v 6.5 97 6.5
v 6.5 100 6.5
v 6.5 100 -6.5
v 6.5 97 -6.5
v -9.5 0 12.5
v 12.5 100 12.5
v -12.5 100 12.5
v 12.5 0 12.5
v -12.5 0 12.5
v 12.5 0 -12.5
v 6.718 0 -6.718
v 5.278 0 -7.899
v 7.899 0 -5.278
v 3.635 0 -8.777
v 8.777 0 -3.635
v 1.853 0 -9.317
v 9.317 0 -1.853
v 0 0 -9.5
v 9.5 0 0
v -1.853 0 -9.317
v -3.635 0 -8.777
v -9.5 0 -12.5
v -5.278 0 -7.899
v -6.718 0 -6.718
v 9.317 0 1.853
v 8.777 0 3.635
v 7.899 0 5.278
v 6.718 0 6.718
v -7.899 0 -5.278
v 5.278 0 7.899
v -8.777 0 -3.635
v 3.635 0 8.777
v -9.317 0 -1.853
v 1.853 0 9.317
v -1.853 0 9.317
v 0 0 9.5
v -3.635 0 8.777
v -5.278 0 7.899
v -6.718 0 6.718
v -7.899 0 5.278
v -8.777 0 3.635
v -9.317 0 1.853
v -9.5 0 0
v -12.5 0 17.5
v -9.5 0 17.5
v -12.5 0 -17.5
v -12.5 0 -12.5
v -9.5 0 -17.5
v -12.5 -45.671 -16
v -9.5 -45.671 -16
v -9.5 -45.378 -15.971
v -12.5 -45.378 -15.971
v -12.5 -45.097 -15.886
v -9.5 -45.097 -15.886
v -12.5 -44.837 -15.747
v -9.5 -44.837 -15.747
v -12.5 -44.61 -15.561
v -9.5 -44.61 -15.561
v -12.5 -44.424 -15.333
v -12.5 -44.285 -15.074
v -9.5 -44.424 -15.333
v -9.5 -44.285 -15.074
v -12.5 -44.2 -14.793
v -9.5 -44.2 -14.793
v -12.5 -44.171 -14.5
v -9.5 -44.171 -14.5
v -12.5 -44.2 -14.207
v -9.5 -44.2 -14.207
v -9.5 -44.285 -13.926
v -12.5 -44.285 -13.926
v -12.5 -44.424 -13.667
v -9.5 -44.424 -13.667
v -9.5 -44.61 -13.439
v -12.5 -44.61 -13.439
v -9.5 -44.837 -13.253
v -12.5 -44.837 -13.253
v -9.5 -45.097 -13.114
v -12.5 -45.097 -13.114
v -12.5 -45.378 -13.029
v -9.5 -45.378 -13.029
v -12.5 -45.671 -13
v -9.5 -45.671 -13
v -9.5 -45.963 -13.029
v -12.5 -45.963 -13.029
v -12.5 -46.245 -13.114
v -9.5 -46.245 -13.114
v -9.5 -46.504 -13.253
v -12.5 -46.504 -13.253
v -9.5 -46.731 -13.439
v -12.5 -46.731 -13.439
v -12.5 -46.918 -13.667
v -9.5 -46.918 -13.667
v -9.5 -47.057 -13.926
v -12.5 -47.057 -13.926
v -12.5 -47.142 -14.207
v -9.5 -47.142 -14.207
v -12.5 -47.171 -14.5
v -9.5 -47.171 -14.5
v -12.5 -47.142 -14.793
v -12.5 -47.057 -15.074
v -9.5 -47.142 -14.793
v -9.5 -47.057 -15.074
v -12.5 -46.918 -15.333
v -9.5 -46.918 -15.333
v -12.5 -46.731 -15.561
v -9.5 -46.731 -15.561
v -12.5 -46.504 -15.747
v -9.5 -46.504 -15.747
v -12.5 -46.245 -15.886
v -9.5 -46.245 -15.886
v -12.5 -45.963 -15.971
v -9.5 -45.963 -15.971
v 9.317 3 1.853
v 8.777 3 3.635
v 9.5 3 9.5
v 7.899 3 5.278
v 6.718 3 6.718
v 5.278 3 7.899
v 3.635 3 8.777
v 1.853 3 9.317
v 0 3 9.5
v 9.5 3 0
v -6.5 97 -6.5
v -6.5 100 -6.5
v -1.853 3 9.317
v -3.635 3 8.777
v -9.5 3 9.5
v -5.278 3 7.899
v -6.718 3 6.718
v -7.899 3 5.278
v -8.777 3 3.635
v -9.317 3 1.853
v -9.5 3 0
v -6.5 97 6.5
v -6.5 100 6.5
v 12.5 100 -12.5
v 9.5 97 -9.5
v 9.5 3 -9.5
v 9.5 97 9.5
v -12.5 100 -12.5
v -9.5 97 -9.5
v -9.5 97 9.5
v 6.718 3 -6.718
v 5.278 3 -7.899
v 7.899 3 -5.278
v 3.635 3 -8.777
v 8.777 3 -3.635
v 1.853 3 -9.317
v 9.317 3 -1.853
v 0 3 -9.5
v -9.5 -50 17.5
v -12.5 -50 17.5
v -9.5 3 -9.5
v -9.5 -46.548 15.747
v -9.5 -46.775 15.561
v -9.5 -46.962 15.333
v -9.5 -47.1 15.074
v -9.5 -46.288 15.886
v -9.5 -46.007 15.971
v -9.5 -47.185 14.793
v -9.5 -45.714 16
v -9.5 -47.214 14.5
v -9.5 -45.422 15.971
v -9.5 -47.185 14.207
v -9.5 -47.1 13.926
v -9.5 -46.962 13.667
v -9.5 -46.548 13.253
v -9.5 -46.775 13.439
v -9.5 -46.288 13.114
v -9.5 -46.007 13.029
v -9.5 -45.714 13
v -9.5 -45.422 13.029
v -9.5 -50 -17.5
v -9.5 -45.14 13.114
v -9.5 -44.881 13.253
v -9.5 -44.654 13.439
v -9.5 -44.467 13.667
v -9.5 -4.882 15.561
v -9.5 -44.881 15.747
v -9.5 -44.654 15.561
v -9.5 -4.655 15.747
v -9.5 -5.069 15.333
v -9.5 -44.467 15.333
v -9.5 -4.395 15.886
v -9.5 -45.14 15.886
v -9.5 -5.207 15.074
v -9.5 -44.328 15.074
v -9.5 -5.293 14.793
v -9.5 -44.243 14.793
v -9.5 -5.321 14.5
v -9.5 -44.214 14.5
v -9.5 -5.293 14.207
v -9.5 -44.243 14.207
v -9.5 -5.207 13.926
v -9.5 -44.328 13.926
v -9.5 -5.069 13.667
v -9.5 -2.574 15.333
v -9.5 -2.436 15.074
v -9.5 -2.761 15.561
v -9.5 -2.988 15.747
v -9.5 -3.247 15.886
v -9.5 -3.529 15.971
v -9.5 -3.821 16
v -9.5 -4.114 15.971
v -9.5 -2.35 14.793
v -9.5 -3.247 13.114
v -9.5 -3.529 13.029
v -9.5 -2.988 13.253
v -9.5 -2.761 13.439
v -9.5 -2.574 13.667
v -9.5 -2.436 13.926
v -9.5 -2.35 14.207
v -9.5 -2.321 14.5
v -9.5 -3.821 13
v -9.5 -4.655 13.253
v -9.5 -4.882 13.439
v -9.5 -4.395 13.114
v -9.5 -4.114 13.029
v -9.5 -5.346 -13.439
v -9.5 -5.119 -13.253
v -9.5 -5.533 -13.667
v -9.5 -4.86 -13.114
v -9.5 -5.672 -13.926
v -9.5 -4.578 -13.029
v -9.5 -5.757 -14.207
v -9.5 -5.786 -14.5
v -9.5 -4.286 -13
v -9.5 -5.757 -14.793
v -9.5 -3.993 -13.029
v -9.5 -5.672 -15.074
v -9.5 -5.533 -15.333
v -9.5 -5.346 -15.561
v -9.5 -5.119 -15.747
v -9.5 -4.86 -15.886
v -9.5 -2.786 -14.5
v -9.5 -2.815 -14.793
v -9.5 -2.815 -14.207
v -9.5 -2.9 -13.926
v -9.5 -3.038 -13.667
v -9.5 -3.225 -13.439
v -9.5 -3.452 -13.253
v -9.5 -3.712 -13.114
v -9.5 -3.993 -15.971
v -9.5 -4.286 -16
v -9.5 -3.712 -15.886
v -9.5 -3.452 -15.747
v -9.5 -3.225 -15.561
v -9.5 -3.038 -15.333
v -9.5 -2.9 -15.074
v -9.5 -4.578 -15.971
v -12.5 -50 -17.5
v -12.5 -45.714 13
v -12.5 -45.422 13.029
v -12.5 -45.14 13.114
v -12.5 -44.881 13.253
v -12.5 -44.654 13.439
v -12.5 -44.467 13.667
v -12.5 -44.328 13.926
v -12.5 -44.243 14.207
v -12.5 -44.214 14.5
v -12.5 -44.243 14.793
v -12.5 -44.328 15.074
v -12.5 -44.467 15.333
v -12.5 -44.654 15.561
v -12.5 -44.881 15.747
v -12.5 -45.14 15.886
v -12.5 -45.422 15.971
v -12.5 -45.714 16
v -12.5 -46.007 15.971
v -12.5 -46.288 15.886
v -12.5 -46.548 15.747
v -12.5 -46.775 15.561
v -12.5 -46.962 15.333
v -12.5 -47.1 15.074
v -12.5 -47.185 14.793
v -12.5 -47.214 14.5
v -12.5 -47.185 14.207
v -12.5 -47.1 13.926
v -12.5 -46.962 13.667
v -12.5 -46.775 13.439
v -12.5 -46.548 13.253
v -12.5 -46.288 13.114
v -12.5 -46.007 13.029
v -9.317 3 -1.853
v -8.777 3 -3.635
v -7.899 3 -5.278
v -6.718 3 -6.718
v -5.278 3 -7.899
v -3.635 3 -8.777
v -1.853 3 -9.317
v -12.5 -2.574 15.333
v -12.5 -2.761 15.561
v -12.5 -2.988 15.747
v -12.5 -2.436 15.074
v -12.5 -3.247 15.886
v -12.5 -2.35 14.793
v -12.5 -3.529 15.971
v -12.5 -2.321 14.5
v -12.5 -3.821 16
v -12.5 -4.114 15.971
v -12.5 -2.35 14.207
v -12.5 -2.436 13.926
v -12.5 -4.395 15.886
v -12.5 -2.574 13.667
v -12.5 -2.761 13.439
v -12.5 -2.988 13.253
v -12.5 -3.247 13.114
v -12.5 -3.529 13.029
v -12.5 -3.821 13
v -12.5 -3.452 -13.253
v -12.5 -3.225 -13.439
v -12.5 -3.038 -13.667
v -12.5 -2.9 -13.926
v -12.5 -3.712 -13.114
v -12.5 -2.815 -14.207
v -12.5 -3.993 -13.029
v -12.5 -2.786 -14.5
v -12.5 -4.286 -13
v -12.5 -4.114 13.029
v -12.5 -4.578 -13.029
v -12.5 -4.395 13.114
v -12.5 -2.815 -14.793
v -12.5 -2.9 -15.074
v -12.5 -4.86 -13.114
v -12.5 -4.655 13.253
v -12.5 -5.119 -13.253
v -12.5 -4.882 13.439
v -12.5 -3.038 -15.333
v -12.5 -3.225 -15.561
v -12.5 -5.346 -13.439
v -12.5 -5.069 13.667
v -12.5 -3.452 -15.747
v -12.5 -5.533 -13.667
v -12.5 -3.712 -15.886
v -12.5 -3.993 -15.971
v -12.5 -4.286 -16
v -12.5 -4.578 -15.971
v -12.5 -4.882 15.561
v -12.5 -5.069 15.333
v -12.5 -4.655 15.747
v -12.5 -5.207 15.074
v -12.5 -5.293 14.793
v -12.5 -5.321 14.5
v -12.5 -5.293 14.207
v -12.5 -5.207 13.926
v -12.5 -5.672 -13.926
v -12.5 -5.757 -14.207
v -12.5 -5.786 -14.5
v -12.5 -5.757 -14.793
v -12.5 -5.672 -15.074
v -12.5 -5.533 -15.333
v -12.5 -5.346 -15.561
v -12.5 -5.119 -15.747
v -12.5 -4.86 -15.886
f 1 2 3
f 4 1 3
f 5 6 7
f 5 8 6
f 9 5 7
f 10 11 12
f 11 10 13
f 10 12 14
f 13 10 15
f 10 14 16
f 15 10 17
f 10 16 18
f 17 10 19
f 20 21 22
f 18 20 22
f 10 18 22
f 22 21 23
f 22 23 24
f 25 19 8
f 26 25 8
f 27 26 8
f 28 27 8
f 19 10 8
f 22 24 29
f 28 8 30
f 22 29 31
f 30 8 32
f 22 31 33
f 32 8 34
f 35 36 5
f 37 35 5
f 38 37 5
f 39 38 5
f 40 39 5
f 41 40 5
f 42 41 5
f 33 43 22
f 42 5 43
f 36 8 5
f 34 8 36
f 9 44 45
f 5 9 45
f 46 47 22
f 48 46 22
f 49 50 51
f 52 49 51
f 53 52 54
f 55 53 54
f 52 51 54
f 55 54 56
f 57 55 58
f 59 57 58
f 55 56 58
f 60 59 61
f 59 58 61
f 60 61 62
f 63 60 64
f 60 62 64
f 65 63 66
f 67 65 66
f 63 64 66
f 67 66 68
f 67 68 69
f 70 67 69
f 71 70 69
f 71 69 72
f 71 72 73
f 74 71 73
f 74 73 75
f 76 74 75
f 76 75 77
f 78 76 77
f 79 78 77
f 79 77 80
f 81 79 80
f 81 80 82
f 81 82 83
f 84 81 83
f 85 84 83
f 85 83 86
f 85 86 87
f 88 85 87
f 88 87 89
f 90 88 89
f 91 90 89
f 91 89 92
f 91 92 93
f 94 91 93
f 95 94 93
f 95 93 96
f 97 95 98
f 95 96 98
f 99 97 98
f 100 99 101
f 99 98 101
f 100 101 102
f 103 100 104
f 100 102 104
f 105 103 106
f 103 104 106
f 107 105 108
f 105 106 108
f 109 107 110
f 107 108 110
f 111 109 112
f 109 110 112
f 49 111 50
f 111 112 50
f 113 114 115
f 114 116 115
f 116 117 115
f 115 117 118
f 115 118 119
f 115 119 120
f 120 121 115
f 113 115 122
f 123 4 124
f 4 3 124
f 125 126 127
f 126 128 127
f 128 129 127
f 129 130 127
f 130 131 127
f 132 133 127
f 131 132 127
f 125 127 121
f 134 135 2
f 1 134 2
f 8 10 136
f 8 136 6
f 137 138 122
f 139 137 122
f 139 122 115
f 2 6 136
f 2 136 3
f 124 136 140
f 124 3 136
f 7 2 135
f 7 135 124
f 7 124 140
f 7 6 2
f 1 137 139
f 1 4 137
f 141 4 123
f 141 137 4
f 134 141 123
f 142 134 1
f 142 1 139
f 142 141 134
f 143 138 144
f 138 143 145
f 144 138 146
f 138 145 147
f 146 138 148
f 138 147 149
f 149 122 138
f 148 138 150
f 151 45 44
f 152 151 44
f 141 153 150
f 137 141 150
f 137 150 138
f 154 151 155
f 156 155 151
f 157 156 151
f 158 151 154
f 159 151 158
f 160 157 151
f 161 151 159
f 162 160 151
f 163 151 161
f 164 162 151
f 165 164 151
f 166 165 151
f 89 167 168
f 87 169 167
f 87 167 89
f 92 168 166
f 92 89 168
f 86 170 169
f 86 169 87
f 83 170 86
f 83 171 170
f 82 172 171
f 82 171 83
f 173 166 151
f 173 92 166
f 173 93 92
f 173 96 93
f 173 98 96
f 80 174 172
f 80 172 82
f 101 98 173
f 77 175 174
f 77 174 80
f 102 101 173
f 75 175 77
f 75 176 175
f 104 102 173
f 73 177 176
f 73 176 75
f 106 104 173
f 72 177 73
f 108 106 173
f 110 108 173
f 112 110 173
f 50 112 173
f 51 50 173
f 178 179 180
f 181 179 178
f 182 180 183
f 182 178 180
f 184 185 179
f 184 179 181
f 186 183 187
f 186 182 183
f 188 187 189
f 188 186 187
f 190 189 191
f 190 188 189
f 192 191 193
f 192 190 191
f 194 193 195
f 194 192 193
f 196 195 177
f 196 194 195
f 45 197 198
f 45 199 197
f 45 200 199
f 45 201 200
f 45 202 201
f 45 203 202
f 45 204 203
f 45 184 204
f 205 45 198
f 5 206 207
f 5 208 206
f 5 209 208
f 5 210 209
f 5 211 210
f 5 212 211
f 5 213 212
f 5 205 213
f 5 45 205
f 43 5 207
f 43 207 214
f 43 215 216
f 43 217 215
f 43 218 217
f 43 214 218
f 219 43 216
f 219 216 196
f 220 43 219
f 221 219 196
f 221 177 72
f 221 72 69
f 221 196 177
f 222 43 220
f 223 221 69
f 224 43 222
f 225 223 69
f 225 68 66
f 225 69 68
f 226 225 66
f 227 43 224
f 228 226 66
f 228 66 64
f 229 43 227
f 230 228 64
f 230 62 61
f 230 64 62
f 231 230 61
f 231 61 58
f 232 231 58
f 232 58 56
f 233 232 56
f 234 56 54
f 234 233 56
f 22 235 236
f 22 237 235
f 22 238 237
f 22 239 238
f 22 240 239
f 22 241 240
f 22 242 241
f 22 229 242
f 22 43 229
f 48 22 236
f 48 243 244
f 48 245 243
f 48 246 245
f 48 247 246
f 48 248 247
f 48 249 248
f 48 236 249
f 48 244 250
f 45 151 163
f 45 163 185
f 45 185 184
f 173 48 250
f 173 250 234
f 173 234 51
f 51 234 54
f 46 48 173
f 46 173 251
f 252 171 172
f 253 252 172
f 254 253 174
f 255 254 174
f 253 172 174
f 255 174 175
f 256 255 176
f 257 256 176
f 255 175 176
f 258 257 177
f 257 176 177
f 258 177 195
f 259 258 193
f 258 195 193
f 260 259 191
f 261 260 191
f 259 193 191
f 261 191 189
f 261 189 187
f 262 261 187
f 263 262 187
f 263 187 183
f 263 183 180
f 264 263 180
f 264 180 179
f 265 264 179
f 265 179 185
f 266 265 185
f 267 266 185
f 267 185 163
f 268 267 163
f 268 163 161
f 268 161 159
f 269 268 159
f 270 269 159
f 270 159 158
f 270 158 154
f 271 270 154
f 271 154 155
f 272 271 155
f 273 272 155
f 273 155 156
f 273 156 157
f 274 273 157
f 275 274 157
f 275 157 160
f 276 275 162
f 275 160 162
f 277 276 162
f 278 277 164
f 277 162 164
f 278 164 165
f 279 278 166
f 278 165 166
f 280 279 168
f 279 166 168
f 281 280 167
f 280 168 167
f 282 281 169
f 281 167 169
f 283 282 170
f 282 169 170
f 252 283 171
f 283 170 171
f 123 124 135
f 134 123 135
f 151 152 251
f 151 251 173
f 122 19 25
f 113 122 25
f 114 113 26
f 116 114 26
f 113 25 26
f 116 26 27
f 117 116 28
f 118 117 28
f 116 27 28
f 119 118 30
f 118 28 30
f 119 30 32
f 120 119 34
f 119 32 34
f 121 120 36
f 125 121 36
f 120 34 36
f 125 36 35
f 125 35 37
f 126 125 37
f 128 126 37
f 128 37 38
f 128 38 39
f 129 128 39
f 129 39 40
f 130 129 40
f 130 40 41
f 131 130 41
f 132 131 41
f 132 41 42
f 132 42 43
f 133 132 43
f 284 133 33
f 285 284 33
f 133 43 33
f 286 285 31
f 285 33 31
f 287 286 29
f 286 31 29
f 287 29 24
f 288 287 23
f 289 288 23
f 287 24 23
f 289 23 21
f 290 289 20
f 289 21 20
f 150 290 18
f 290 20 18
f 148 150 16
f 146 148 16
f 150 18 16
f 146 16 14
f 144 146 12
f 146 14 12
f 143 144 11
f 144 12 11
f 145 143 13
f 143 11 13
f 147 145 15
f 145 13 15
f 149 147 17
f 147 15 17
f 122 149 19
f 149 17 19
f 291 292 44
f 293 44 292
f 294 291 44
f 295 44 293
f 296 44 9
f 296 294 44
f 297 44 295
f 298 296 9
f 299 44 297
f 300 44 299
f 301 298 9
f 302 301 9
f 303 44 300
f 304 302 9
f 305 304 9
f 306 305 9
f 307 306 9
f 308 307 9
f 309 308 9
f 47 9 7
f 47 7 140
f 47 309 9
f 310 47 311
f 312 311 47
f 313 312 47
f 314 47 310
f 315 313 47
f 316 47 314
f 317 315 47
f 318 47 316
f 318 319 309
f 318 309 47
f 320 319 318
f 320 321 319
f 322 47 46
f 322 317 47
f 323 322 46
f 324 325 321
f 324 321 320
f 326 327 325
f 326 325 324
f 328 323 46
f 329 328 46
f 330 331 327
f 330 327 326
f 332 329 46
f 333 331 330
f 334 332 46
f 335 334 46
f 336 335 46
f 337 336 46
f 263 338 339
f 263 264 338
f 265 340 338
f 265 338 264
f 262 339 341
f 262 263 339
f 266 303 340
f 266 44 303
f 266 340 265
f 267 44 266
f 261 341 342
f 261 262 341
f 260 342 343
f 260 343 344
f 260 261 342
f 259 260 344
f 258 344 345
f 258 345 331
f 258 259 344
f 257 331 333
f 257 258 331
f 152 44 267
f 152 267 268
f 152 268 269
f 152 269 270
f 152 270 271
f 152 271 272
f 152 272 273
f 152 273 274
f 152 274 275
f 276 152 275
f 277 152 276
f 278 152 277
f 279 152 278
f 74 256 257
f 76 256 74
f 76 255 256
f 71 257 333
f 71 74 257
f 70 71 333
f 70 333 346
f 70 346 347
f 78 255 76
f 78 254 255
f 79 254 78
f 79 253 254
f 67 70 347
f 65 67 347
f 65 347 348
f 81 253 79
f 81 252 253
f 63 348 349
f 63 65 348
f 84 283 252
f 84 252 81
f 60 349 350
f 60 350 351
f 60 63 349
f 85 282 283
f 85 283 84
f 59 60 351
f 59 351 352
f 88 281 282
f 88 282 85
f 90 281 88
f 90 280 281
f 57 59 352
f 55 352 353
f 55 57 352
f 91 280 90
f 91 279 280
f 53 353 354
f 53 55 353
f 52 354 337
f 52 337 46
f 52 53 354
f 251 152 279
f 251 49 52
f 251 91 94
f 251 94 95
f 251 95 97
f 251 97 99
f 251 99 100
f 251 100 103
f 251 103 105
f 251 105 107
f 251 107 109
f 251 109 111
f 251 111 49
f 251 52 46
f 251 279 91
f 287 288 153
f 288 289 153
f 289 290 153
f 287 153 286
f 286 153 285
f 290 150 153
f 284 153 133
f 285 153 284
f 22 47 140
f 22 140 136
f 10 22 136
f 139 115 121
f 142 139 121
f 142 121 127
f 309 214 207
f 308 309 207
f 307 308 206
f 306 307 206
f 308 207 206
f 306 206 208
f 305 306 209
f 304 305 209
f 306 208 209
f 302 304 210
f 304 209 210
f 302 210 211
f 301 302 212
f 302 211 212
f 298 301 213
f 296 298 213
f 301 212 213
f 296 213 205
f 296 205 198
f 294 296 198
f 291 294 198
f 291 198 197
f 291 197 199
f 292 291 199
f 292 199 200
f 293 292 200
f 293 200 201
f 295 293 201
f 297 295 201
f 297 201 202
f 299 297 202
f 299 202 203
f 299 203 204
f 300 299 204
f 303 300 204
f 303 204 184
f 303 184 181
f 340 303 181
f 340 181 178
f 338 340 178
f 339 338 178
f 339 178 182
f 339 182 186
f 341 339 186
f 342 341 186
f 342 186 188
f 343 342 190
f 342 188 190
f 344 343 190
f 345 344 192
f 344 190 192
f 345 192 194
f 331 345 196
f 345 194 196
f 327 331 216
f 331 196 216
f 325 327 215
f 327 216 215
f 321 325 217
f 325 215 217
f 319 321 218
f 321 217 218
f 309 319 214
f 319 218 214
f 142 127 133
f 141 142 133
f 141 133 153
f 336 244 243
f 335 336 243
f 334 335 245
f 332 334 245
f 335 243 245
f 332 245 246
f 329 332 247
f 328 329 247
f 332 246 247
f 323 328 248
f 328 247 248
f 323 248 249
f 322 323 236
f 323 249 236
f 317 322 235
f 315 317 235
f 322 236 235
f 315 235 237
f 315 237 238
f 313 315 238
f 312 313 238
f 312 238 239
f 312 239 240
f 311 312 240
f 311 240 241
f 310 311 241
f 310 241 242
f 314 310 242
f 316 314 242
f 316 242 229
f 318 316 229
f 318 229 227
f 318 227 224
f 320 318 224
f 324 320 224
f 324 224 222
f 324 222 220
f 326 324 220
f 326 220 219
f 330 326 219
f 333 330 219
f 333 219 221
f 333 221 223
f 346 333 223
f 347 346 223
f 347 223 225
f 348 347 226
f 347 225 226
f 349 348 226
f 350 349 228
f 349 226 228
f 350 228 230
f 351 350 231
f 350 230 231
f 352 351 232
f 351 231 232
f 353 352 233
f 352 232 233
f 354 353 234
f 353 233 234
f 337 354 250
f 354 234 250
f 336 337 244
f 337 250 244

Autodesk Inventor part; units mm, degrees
ref_plane "YZ Plane" through (0, 0, 0) normal (1, 0, 0) x (0, 1, 0)
ref_plane "XZ Plane" through (0, 0, 0) normal (0, 1, 0) x (-1, 0, 0)
ref_plane "XY Plane" through (0, 0, 0) normal (0, 0, 1) x (1, 0, 0)
sketch "Sketch1" plane through (0, 0, 0) normal (0, 1, 0) x (-1, 0, 0)
  line L0 (-12.5, 12.5) -> (12.5, 12.5)
  line L1 (12.5, 12.5) -> (12.5, -12.5)
  line L2 (12.5, -12.5) -> (-12.5, -12.5)
  line L3 (-12.5, -12.5) -> (-12.5, 12.5)
  line L4 (-12.5, 12.5) -> (12.5, -12.5) construction
  line L5 (12.5, 12.5) -> (-12.5, -12.5) construction
  line L6 (-9.5, 9.5) -> (9.5, 9.5)
  line L7 (9.5, 9.5) -> (9.5, -9.5)
  line L8 (9.5, -9.5) -> (-9.5, -9.5)
  line L9 (-9.5, -9.5) -> (-9.5, 9.5)
  line L10 (-9.5, 9.5) -> (9.5, -9.5) construction
  line L11 (9.5, 9.5) -> (-9.5, -9.5) construction
  point P0 (0, 0)
  dimension "d0" = 25
  dimension "d1" = 25
  dimension "d2" = 3
  dimension "d3" = 3
extrude "Extrusion1" add sketch "Sketch1" along normal blind 100
sketch "Sketch2" plane through (-9.5, 0, 9.5) normal (1, 0, 0) x (0, 0, -1)
  line L0 (0, 0) -> (0, 100) projected
  line L1 (19, 0) -> (19, 100) projected
  line L2 (0, 0) -> (0, 100) projected
  line L3 (19, 0) -> (19, 100) projected
  line L4 (0, 100) -> (19, 100)
  line L5 (19, 100) -> (19, 97)
  line L6 (19, 97) -> (0, 97)
  line L7 (0, 97) -> (0, 100)
  point P0 (9.5, 0)
  point P1 (0, 97)
  point P2 (19, 97)
  dimension "d6" = 3
extrude "Extrusion2" add sketch "Sketch2" along normal up to surface (19 mm away)
sketch "Sketch3" plane through (0, 100, 0) normal (0, 1, 0) x (1, 0, 0)
  line L0 (9.5, -9.5) -> (9.5, 9.5) projected
  line L1 (-9.5, -9.5) -> (9.5, -9.5) projected
  line L2 (-9.5, 9.5) -> (-9.5, -9.5) projected
  line L3 (9.5, 9.5) -> (-9.5, 9.5) projected
  line L4 (3.5, 3.5) -> (-3.5, 3.5)
  line L5 (-3.5, 3.5) -> (-3.5, -3.5)
  line L6 (-3.5, -3.5) -> (3.5, -3.5)
  line L7 (3.5, -3.5) -> (3.5, 3.5)
  line L8 (3.5, 3.5) -> (-3.5, -3.5) construction
  line L9 (-3.5, 3.5) -> (3.5, -3.5) construction
  line L10 (6.5, 6.5) -> (-6.5, 6.5)
  line L11 (-6.5, 6.5) -> (-6.5, -6.5)
  line L12 (-6.5, -6.5) -> (6.5, -6.5)
  line L13 (6.5, -6.5) -> (6.5, 6.5)
  line L14 (6.5, 6.5) -> (-6.5, -6.5) construction
  line L15 (-6.5, 6.5) -> (6.5, -6.5) construction
  point P0 (0, 0)
  dimension "d9" = 13
  dimension "d10" = 13
  dimension "d11" = 3
  dimension "d12" = 3
extrude "Extrusion3" cut sketch "Sketch3" against normal blind 200 contours L7 L6 L5 L4 | L13 L12 L11 L10
sketch "Sketch4" plane through (-9.5, 0, 9.5) normal (1, 0, 0) x (0, 0, -1)
  line L0 (0, 0) -> (0, 97) projected
  line L1 (19, 0) -> (19, 97) projected
  line L2 (0, 0) -> (19, 0)
  line L3 (19, 0) -> (19, 3)
  line L4 (19, 3) -> (0, 3)
  line L5 (0, 3) -> (0, 0)
  point P0 (9.5, 0)
  dimension "d15" = 3
extrude "Extrusion4" add sketch "Sketch4" along normal up to surface (19 mm away)
sketch "Sketch5" plane through (0, 0, 0) normal (0, -1, 0) x (1, 0, 0)
  line L0 (-6.5, 6.5) -> (6.5, 6.5) projected
  line L1 (6.5, 6.5) -> (6.5, -6.5) projected
  line L2 (6.5, -6.5) -> (-6.5, -6.5) projected
  line L3 (-6.5, -6.5) -> (-6.5, 6.5) projected
  line L4 (-9.5, -9.5) -> (9.5, -9.5) projected
  line L5 (9.5, -9.5) -> (9.5, 9.5) projected
  line L6 (9.5, 9.5) -> (-9.5, 9.5) projected
  line L7 (-9.5, 9.5) -> (-9.5, -9.5) projected
  circle A0 centre (0, 0) radius 5
extrude "Extrusion5" cut sketch "Sketch5" against normal blind 200 contours A0
sketch "Sketch9" plane through (0, 0, 0) normal (0, -1, 0) x (1, 0, 0)
  circle A0 centre (0, 0) radius 9.5 projected
  point P0 (0, 0)
extrude "Extrusion9" cut sketch "Sketch9" against normal blind 10
sketch "Sketch10" plane through (0, 0, 0) normal (0, -1, 0) x (1, 0, 0)
  line L0 (12.5, -12.5) -> (-12.5, -12.5) projected
  line L1 (-12.5, -12.5) -> (-12.5, 12.5) projected
  line L2 (-12.5, -12.5) -> (-12.5, 12.5) projected
  line L3 (-12.5, 12.5) -> (-9.5, 12.5)
  line L4 (-9.5, 12.5) -> (-9.5, -12.5)
  line L5 (-9.5, -12.5) -> (-12.5, -12.5)
  line L6 (-12.5, -12.5) -> (-12.5, 12.5)
  line L7 (-6.024, 15.0194) -> (-8.024, 15.0194) projected
  line L8 (-8.024, -14.9806) -> (-6.024, -14.9806) projected
  line L9 (-12.5, 12.5) -> (12.5, 12.5) projected
  line L10 (-12.5, 12.5) -> (-9.5, 12.5)
  line L11 (-9.5, 12.5) -> (-9.5, 17.5)
  line L12 (-9.5, 17.5) -> (-12.5, 17.5)
  line L13 (-12.5, 17.5) -> (-12.5, 12.5)
  line L14 (12.5, -12.5) -> (-12.5, -12.5) projected
  line L15 (-12.5, -12.5) -> (-9.5, -12.5)
  line L16 (-9.5, -12.5) -> (-9.5, -17.5)
  line L17 (-9.5, -17.5) -> (-12.5, -17.5)
  line L18 (-12.5, -17.5) -> (-12.5, -12.5)
  point P0 (0, 0)
  point P1 (-12.5, 0)
  dimension "d53" = 3
  dimension "d54" = 25
  dimension "d55" = 5
  dimension "d56" = 5
extrude "Extrusion10" add sketch "Sketch10" along normal blind 50
sketch "Sketch11" plane through (-9.5, 0, -12.5) normal (1, 0, 0) x (0, 0, -1)
  line L0 (-30, 0) -> (-30, -50) construction
  line L1 (0, 0) -> (5, 0) construction
  line L2 (-30, -50) -> (5, 0) construction
  line L3 (5, 0) -> (-29.6481, 0) construction
  line L4 (-29.6481, 0) -> (5, -50) construction
  circle A0 centre (-27, -45.7143) radius 1.5
  circle A1 centre (-27, -3.8214) radius 1.5
  circle A2 centre (2, -4.2857) radius 1.5
  circle A3 centre (2, -45.6708) radius 1.5
  line L5 (5, 0) -> (5, -50) projected
  point P0 (-12.5, 0)
  dimension "d57" = 3
  dimension "d58" = 3
  dimension "d59" = 3
  dimension "d60" = 3
  dimension "d61" = 3
  dimension "d62" = 3
  dimension "d63" = 3
  dimension "d64" = 3
extrude "Extrusion11" cut sketch "Sketch11" against normal through all
properties part number "Cylinder"
